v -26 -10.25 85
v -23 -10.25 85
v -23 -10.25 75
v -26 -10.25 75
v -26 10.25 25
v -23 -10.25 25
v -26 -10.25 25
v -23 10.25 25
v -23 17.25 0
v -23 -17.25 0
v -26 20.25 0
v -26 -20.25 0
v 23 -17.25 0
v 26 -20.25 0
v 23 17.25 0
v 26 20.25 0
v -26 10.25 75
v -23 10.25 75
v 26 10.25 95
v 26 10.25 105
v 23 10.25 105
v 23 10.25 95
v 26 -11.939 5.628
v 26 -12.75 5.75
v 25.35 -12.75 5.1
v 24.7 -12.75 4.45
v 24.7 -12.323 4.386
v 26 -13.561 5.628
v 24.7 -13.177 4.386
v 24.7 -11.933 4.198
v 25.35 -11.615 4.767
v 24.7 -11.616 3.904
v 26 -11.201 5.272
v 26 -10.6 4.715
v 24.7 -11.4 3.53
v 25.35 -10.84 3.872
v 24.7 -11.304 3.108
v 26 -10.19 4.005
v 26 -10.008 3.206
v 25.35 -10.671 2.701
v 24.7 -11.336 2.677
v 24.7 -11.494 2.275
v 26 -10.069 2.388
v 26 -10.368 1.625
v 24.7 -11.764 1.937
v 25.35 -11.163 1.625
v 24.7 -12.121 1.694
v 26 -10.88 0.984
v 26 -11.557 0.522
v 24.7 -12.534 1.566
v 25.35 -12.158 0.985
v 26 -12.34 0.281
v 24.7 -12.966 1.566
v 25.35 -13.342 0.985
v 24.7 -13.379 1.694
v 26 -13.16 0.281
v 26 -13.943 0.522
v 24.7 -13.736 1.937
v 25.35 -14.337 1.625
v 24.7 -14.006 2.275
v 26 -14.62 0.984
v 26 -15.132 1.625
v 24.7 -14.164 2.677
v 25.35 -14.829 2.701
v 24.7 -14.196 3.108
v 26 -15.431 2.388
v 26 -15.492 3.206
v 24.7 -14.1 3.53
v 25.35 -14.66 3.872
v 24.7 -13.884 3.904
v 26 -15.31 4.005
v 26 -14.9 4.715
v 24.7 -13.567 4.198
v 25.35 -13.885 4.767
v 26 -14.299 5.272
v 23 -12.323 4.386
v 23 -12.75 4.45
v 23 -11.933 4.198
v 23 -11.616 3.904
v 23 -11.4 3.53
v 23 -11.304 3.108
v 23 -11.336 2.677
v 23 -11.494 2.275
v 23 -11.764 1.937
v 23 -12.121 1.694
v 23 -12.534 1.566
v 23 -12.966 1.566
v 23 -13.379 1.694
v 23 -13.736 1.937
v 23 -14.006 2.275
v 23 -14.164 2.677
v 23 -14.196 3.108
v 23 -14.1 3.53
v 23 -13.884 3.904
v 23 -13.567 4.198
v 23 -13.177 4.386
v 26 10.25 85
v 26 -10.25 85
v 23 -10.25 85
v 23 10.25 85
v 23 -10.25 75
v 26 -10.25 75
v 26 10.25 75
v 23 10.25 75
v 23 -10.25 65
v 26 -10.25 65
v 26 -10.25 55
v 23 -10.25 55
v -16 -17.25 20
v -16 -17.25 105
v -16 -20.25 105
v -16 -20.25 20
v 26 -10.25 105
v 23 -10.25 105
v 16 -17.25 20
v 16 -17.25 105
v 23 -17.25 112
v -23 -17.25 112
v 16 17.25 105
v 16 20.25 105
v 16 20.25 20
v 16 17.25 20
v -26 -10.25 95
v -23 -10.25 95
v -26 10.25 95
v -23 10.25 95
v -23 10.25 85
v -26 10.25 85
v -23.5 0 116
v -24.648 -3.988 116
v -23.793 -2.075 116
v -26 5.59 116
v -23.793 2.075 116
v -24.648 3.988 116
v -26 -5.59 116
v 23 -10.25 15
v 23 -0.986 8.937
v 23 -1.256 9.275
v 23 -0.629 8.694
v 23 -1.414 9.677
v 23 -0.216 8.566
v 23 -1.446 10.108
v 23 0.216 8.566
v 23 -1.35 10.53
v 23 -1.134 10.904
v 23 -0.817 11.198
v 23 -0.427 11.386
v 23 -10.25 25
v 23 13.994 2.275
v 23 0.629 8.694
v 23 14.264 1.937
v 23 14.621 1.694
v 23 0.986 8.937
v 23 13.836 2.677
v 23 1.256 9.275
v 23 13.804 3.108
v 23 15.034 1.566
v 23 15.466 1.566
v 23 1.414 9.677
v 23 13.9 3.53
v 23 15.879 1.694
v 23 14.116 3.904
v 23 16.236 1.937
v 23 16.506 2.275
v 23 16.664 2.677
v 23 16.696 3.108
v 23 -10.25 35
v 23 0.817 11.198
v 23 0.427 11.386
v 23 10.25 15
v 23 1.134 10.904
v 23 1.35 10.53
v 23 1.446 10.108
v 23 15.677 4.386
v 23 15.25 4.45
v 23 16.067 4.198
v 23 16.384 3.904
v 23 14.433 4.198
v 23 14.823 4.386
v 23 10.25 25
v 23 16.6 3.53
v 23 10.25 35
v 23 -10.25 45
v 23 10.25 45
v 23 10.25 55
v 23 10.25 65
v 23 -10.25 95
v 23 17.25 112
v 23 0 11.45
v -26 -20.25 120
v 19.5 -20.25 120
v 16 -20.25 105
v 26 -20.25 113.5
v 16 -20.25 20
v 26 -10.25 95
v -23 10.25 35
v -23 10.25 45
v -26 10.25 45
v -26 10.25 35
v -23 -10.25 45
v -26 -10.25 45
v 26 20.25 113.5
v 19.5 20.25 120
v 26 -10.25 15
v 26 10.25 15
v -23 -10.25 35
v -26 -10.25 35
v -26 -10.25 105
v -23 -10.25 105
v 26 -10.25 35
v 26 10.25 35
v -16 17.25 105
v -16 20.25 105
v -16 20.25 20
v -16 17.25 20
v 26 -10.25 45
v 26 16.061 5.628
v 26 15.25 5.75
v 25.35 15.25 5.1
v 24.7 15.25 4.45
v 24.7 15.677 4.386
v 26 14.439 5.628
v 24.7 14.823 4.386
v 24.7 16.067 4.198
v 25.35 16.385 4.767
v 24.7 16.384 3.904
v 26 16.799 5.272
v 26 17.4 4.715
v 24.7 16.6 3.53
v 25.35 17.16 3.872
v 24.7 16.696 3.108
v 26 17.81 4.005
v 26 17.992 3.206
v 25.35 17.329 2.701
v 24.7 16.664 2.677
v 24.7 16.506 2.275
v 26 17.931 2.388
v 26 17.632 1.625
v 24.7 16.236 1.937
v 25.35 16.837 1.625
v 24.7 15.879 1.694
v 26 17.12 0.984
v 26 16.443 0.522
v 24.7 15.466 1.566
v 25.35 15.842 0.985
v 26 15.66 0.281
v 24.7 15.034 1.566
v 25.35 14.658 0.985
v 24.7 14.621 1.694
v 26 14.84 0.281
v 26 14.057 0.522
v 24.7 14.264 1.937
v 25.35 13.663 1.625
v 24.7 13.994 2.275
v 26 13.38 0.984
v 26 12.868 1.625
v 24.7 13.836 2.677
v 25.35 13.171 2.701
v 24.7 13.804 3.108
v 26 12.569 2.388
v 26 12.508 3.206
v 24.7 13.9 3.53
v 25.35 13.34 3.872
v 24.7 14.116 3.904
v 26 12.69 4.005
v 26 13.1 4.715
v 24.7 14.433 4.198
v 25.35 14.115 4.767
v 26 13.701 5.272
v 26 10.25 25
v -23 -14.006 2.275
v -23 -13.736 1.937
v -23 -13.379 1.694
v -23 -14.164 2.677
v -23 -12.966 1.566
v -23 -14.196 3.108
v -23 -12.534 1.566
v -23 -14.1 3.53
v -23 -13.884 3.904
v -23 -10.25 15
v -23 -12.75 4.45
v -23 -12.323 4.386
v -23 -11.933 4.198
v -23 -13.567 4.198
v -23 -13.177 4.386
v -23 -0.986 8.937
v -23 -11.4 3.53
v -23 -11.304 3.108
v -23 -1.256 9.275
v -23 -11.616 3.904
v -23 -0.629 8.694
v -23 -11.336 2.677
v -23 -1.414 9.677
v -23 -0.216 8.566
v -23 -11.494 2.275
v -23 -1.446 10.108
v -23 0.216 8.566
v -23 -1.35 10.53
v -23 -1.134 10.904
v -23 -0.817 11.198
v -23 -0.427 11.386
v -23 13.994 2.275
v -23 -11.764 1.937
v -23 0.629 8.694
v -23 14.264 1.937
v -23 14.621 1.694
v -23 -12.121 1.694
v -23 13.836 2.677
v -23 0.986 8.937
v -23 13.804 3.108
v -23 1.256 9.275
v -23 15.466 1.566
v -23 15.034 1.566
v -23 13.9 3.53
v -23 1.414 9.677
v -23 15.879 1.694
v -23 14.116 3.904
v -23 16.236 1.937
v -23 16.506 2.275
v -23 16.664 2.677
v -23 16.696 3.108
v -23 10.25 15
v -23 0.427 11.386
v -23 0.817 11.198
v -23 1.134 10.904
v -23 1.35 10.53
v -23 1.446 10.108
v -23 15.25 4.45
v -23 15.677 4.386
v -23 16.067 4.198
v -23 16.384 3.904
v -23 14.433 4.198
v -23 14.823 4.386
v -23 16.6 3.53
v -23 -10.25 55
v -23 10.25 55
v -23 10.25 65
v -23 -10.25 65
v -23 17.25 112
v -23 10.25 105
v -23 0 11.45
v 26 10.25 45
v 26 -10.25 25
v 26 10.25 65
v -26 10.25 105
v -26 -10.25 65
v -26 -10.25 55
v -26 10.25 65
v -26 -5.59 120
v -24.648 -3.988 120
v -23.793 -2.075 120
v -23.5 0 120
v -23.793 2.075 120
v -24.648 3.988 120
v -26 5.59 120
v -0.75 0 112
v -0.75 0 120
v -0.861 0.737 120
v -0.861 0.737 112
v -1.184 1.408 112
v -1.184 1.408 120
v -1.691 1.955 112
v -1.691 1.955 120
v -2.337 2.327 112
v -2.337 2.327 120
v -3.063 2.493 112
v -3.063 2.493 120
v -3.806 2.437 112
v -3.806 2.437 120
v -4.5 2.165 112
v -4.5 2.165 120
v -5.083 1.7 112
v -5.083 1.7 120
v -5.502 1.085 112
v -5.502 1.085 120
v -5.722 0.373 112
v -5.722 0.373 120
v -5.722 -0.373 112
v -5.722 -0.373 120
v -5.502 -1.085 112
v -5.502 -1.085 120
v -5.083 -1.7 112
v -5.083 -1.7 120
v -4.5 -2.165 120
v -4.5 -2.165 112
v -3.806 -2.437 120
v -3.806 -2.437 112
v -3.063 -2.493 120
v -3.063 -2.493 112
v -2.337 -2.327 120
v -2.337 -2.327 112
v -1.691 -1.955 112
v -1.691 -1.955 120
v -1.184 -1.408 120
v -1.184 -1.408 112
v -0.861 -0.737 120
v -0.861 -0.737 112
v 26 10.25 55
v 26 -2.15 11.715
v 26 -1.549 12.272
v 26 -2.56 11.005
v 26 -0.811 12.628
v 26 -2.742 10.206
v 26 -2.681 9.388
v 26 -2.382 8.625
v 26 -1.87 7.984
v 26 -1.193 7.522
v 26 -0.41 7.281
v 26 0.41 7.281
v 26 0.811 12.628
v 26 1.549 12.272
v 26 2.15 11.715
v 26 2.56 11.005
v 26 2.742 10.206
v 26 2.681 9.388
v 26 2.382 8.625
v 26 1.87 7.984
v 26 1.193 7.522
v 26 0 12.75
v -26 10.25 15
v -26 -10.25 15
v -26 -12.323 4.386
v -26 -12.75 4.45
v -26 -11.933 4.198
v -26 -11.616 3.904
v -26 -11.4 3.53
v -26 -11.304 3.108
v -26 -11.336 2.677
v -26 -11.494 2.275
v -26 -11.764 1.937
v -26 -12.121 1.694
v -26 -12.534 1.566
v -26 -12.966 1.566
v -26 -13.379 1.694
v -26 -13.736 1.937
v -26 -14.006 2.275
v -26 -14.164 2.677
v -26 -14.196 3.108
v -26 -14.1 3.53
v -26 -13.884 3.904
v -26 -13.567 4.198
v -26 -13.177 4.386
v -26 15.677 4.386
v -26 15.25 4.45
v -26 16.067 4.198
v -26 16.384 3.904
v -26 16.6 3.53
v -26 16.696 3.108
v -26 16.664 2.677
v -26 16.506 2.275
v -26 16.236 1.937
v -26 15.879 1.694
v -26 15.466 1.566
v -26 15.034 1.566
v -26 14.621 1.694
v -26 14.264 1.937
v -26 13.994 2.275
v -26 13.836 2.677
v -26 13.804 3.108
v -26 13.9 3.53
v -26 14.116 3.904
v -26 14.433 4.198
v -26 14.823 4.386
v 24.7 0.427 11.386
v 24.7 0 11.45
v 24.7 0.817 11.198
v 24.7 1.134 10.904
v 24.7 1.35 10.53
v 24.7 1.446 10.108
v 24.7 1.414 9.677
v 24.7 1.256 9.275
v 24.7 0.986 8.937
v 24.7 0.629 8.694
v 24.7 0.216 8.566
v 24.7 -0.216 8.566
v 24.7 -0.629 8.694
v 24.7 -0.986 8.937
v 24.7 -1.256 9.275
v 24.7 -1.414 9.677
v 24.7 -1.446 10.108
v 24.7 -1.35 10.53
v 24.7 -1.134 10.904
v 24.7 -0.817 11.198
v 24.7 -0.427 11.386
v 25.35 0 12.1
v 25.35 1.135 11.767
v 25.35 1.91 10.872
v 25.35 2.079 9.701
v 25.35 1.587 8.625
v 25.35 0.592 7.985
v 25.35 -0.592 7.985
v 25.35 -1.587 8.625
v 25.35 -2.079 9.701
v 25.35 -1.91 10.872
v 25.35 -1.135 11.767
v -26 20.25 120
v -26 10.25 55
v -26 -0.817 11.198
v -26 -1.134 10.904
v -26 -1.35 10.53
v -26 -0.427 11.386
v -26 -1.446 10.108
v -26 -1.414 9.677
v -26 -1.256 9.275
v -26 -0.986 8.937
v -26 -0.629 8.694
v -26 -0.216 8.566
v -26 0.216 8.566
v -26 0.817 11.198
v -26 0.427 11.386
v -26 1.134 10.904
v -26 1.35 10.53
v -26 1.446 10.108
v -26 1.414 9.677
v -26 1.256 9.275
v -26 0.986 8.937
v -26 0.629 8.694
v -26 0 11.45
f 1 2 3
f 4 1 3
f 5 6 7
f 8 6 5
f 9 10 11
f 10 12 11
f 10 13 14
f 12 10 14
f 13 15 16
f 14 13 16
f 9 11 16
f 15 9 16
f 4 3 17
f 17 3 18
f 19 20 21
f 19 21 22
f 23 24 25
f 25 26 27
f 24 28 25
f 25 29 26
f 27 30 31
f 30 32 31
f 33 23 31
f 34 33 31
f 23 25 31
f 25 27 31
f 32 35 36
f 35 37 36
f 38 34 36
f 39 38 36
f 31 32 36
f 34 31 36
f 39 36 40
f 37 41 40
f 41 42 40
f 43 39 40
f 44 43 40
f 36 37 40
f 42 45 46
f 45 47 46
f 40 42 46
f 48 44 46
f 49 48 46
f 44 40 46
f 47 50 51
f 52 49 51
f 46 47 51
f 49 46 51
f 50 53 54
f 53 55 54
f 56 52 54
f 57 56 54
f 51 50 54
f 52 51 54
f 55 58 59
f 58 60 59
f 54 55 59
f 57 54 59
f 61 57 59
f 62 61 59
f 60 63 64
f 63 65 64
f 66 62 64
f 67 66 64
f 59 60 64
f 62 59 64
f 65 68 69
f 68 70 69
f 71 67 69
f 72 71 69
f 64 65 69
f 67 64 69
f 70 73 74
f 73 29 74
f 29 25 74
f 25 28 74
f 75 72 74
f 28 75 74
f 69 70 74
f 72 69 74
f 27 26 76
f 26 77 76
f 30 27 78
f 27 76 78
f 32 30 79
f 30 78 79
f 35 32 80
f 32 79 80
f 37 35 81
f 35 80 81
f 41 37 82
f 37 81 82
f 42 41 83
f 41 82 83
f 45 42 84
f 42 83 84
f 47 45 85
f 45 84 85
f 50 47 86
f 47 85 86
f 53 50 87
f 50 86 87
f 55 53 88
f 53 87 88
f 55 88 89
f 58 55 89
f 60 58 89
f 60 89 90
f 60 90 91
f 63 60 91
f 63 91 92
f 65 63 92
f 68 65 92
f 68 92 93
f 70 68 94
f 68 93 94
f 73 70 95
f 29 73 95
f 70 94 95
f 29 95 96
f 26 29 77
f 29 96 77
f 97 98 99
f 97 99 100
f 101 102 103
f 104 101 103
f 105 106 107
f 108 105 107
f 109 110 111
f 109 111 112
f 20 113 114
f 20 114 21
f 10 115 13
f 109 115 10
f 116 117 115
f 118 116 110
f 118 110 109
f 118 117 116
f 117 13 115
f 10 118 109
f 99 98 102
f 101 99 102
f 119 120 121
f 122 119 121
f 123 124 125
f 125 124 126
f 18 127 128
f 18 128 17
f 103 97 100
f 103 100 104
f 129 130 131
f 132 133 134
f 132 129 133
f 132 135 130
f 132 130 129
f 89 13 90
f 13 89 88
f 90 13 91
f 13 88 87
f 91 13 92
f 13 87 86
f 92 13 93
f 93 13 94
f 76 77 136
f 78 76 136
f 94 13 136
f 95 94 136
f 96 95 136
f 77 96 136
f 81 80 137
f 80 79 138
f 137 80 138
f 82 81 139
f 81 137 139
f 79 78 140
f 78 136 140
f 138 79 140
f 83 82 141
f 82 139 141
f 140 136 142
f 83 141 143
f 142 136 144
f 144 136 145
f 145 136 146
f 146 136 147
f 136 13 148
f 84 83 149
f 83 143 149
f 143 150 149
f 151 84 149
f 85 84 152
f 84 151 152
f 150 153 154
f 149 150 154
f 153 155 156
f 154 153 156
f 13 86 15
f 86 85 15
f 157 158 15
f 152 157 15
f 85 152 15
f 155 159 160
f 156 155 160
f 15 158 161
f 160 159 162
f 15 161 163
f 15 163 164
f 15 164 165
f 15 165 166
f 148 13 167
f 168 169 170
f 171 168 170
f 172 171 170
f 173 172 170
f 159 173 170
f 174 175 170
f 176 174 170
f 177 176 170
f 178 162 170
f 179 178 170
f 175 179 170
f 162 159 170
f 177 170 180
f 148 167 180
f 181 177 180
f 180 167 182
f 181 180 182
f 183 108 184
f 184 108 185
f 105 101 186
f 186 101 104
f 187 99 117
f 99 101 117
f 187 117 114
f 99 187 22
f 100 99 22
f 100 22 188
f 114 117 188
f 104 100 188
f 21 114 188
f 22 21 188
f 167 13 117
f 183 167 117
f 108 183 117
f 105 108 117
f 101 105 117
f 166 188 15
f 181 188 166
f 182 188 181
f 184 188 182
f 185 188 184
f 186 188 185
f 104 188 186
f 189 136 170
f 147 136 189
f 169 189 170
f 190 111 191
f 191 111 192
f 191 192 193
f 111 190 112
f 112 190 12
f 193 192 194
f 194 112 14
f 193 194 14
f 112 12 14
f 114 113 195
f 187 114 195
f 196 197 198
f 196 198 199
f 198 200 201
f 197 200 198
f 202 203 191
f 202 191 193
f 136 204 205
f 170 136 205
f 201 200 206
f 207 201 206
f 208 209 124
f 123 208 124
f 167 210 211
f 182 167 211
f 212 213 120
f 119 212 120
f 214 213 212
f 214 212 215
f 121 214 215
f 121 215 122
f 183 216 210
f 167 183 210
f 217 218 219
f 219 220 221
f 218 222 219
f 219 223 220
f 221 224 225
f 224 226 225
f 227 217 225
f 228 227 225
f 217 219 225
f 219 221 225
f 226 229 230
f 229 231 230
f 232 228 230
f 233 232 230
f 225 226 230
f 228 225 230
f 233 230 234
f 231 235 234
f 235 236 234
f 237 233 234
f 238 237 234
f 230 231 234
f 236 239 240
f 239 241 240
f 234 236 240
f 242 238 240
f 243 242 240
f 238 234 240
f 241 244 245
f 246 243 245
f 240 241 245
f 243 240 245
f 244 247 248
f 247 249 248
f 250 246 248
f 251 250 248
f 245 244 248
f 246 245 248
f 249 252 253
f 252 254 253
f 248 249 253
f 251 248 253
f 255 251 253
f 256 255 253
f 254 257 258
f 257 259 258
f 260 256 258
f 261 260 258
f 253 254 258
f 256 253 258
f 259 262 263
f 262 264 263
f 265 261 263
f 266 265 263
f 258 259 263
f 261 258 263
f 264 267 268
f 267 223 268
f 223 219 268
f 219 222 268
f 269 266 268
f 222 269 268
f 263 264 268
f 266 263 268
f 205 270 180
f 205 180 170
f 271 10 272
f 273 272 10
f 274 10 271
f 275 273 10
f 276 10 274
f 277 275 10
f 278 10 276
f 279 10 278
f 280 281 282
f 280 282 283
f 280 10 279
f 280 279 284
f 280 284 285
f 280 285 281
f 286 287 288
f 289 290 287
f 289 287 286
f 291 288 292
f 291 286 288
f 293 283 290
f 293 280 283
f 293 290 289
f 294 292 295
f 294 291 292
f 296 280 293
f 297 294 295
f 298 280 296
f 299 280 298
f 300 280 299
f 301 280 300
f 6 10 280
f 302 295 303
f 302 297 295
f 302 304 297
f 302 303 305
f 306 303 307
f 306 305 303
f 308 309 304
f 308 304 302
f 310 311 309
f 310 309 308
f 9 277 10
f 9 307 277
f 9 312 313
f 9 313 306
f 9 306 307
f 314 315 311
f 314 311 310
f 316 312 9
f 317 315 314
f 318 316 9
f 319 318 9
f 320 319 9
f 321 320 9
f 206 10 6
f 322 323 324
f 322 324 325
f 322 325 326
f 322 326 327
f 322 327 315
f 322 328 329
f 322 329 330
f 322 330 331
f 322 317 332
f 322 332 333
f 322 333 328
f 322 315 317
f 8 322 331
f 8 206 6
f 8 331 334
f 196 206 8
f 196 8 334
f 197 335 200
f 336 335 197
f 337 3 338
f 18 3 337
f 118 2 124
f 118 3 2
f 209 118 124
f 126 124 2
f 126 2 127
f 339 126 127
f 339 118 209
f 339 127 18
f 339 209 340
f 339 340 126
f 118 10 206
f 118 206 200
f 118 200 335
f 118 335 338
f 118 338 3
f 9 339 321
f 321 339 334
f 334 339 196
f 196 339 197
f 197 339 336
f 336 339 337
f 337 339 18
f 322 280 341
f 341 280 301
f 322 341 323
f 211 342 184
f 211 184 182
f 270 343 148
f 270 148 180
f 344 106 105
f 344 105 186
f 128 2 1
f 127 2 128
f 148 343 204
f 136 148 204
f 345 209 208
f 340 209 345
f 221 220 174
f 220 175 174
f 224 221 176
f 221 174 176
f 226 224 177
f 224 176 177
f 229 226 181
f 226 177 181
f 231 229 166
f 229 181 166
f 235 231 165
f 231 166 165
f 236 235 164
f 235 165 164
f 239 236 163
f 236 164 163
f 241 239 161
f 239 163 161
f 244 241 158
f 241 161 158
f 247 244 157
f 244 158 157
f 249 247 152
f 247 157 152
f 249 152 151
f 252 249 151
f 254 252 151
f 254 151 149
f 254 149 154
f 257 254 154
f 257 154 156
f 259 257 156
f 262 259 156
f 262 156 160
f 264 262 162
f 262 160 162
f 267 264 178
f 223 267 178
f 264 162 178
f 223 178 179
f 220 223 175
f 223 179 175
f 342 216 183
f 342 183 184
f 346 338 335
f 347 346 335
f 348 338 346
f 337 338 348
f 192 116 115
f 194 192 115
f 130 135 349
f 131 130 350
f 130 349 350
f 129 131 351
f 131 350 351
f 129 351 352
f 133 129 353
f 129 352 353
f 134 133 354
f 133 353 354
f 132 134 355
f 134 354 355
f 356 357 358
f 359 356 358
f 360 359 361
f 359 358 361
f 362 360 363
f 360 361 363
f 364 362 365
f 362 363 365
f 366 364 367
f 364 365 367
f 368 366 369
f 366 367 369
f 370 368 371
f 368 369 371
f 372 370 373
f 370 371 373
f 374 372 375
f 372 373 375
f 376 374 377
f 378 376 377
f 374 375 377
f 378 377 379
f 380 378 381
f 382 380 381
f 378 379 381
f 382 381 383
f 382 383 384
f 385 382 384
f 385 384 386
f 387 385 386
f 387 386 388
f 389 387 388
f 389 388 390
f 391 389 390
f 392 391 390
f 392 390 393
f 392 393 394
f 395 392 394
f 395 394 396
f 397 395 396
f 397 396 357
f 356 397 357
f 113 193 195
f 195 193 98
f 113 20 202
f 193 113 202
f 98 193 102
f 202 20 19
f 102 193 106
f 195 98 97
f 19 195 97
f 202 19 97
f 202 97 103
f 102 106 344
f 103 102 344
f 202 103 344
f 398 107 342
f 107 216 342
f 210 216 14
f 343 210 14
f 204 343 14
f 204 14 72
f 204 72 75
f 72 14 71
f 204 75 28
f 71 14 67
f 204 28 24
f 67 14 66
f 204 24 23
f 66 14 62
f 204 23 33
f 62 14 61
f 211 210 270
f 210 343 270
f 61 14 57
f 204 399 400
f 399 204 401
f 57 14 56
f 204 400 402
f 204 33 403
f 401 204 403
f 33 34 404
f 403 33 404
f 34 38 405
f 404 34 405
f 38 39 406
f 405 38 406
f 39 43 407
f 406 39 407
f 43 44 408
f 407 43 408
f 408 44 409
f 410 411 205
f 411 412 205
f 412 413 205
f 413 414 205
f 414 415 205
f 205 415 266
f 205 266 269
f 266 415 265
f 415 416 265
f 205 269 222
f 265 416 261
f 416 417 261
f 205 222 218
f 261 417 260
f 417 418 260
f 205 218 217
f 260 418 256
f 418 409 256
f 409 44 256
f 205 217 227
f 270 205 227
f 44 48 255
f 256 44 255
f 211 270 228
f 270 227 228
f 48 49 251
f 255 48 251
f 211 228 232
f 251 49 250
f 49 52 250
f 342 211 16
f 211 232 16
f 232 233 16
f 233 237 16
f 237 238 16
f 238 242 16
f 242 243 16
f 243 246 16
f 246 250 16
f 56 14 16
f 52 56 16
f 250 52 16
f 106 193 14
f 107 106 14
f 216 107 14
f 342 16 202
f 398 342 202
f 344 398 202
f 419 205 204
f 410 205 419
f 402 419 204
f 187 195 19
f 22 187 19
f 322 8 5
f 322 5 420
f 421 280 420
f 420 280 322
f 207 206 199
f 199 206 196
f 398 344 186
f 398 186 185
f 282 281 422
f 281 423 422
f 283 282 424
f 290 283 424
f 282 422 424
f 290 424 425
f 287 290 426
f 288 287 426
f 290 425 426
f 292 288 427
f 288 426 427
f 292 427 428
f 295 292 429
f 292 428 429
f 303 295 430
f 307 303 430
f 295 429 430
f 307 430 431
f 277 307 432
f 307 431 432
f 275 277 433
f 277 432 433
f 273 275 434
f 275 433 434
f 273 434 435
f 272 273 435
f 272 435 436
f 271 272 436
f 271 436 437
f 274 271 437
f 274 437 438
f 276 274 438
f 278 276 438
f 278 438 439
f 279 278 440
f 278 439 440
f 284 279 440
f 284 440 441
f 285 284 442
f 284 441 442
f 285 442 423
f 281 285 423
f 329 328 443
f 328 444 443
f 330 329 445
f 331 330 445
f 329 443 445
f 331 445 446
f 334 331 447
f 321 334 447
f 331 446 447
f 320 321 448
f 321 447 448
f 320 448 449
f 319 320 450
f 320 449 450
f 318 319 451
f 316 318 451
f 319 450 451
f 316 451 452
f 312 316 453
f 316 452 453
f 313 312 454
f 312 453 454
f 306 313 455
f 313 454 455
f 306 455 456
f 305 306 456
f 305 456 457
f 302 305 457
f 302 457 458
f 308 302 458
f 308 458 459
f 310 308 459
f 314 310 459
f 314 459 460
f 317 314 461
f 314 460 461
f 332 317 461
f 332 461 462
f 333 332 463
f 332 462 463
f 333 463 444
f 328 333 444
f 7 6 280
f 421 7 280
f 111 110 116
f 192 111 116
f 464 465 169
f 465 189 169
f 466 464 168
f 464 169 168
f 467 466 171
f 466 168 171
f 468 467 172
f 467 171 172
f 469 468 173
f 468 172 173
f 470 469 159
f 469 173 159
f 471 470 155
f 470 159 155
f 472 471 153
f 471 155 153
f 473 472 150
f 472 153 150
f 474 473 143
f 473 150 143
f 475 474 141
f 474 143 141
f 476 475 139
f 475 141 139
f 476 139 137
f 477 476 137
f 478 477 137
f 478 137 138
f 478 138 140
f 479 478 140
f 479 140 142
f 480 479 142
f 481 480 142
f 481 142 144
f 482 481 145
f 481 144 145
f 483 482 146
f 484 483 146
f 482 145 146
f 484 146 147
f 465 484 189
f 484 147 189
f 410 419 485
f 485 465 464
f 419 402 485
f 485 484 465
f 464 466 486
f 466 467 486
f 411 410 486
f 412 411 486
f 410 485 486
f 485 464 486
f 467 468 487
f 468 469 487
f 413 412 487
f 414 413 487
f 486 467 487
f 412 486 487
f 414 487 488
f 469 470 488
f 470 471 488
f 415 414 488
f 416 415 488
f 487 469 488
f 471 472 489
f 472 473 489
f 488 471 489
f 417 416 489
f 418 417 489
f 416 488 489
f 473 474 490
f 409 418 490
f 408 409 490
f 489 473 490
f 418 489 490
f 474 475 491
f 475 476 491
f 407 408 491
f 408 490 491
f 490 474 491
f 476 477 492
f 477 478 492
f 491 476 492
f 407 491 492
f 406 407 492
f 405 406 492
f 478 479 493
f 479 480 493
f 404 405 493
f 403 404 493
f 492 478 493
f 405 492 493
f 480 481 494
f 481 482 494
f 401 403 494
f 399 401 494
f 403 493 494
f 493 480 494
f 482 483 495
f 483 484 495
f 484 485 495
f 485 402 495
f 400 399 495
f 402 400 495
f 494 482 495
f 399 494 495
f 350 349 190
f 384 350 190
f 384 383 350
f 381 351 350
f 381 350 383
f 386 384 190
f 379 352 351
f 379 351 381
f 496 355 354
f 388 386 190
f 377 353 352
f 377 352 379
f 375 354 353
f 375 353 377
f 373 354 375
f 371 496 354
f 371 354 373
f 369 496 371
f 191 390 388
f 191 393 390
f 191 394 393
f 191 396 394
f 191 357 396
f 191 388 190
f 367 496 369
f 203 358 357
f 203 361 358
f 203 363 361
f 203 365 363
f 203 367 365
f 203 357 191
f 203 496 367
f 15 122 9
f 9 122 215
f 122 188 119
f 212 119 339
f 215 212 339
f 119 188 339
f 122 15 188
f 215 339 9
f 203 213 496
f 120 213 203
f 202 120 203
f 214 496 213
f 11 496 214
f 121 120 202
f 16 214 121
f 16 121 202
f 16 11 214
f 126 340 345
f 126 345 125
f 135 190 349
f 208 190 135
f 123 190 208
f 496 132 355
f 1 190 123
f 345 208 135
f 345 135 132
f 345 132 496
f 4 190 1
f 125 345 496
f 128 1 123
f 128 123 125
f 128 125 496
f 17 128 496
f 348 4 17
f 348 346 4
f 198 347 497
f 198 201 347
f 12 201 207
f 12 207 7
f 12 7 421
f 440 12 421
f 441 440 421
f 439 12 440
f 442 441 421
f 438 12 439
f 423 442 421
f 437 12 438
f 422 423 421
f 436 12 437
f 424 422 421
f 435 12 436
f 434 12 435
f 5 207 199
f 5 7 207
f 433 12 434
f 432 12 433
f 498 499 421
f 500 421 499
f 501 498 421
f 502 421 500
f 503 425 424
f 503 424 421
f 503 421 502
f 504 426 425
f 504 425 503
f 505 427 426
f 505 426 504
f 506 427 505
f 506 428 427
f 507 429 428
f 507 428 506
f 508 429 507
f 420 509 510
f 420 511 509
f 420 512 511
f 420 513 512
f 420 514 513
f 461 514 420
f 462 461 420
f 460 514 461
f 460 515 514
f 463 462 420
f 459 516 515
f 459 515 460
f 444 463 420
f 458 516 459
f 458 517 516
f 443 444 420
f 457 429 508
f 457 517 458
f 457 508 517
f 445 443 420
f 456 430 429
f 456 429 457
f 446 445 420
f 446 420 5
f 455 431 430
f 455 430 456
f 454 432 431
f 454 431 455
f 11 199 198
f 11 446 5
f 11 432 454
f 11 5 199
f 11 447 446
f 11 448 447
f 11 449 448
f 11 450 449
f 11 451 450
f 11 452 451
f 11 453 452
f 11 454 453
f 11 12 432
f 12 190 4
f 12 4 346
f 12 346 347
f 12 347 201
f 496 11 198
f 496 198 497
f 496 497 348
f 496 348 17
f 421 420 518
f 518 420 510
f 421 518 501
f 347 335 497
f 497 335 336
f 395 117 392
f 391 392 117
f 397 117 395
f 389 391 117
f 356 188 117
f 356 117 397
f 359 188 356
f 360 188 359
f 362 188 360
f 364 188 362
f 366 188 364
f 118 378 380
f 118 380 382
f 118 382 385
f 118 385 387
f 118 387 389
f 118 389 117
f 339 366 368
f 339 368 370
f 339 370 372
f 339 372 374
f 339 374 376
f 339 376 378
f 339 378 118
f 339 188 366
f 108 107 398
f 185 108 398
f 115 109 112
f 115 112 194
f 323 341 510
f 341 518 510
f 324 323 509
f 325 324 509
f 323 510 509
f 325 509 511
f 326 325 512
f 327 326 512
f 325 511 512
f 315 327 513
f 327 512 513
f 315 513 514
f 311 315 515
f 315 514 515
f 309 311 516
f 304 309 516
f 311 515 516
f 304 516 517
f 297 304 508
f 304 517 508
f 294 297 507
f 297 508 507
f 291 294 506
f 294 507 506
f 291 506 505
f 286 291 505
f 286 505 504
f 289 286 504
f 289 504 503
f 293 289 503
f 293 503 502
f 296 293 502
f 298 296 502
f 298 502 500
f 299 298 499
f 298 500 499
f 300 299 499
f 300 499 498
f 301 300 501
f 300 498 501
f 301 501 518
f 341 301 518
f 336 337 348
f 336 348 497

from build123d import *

# Parameters (mm, degrees)
MAIN_SKETCH_W                                    = 52
MAIN_SKETCH_H                                    = 40.5
MAIN_EXTRUSION_DEPTH                             = 120
MAIN_HOLE_START                                  = -112
MAIN_HOLE_SKETCH_W                               = 46
MAIN_HOLE_SKETCH_H                               = 34.5
MAIN_HOLE_DEPTH                                  = 112
FRAISAGE_POUR_VIS_T_TE_FRAIS_E_M2_51_D           = 2.9
FRAISAGE_POUR_VIS_T_TE_FRAIS_E_M2_51_CSINK_D     = 5.5
FRAISAGE_POUR_VIS_T_TE_FRAIS_E_M2_51_CSINK_ANGLE = 90
ESQUISSE6_W                                      = 10
ESQUISSE6_H                                      = 20.5
ENL_V_MAT_EXTRU_3_DEPTH                          = 133.340706134
ESQUISSE7_W                                      = 32
ESQUISSE7_H                                      = 85
ENL_V_MAT_EXTRU_4_DEPTH                          = 130.291337684
R_P_TITION_LIN_AIRE1_COUNT                       = 5
R_P_TITION_LIN_AIRE1_PITCH                       = 20
ENL_V_MAT_EXTRU_5_DEPTH                          = 130.291337684
ESQUISSE10_R                                     = 7.5
ENL_V_MAT_EXTRU_7_DEPTH                          = 4
FRAISAGE_POUR_VIS_T_TE_FRAIS_E_M2_52_D           = 2.9
FRAISAGE_POUR_VIS_T_TE_FRAIS_E_M2_52_CSINK_D     = 5.5
FRAISAGE_POUR_VIS_T_TE_FRAIS_E_M2_52_CSINK_ANGLE = 90
R_P_TITION_LIN_AIRE3_COUNT                       = 2
R_P_TITION_LIN_AIRE3_PITCH                       = 28
ENL_V_MAT_EXTRU_8_REACH                          = 126.443
ESQUISSE13_R                                     = 2.5


with BuildPart() as part:
    # Main-Sketch → Main-Extrusion (new body)
    with BuildSketch(Plane.XY):
        Rectangle(MAIN_SKETCH_W, MAIN_SKETCH_H)
    extrude(amount=MAIN_EXTRUSION_DEPTH)

    # Main-Hole-Sketch → Main-Hole (cut)
    with BuildSketch(Plane(origin=(0, 0, 0), x_dir=(-1, 0, 0), z_dir=(0, 0, -1)).offset(MAIN_HOLE_START)):
        Rectangle(MAIN_HOLE_SKETCH_W, MAIN_HOLE_SKETCH_H)
    extrude(amount=MAIN_HOLE_DEPTH, mode=Mode.SUBTRACT)

    # Fraisage pour vis à tête fraisée M2.51 (through all)
    with Locations(Plane(origin=(26, 0, 0), x_dir=(0, 0, -1), z_dir=(1, 0, 0))):
        with Locations((-10, 0)):
            CounterSinkHole(FRAISAGE_POUR_VIS_T_TE_FRAIS_E_M2_51_D / 2, FRAISAGE_POUR_VIS_T_TE_FRAIS_E_M2_51_CSINK_D / 2, counter_sink_angle=FRAISAGE_POUR_VIS_T_TE_FRAIS_E_M2_51_CSINK_ANGLE)

    # Esquisse6 → Enlèv. mat.-Extru.3 (cut, through all)
    with BuildSketch(Plane(origin=(26, 0, 0), x_dir=(0, 0, -1), z_dir=(1, 0, 0))):
        with Locations((-100, 0)):
            Rectangle(ESQUISSE6_W, ESQUISSE6_H)
    enl_v_mat_extru_3 = extrude(amount=-ENL_V_MAT_EXTRU_3_DEPTH, mode=Mode.SUBTRACT)

    # Esquisse7 → Enlèv. mat.-Extru.4 (cut, through all)
    with BuildSketch(Plane(origin=(0, 20.25, 0), x_dir=(1, 0, 0), z_dir=(0, 1, 0))):
        with Locations((0, -62.5)):
            Rectangle(ESQUISSE7_W, ESQUISSE7_H)
    extrude(amount=-ENL_V_MAT_EXTRU_4_DEPTH, mode=Mode.SUBTRACT)

    # Répétition linéaire1: Enlèv. mat.-Extru.3 ×5
    with Locations(*[(0, 0, -i * R_P_TITION_LIN_AIRE1_PITCH) for i in range(1, R_P_TITION_LIN_AIRE1_COUNT)]):
        add(enl_v_mat_extru_3, mode=Mode.SUBTRACT)

    # Esquisse8 → Enlèv. mat.-Extru.5 (cut, through all)
    with BuildSketch(Plane(origin=(0, 20.25, 0), x_dir=(-1, 0, 0), z_dir=(0, 1, 0))):
        Polygon((-19.5, 120), (-26, 113.5), (-26, 120), align=None)
    extrude(amount=-ENL_V_MAT_EXTRU_5_DEPTH, mode=Mode.SUBTRACT)

    # Esquisse10 → Enlèv. mat.-Extru.7 (cut)
    with BuildSketch(Plane.XY.offset(120)):
        with Locations((-31, 0)):
            Circle(ESQUISSE10_R)
    extrude(amount=-ENL_V_MAT_EXTRU_7_DEPTH, mode=Mode.SUBTRACT)

    # Fraisage pour vis à tête fraisée M2.52 (through all)
    with Locations(Plane(origin=(26, 0, 0), x_dir=(0, 0, -1), z_dir=(1, 0, 0))):
        with Locations((-3, 15.25)):
            fraisage_pour_vis_t_te_frais_e_m2_52 = CounterSinkHole(FRAISAGE_POUR_VIS_T_TE_FRAIS_E_M2_52_D / 2, FRAISAGE_POUR_VIS_T_TE_FRAIS_E_M2_52_CSINK_D / 2, counter_sink_angle=FRAISAGE_POUR_VIS_T_TE_FRAIS_E_M2_52_CSINK_ANGLE)

    # Répétition linéaire3: Fraisage pour vis à tête fraisée M2.52 ×2
    with Locations(*[(0, -i * R_P_TITION_LIN_AIRE3_PITCH, 0) for i in range(1, R_P_TITION_LIN_AIRE3_COUNT)]):
        add(fraisage_pour_vis_t_te_frais_e_m2_52, mode=Mode.SUBTRACT)

    # Esquisse13 → Enlèv. mat.-Extru.8 (cut, up to next)
    with BuildSketch(Plane.XY.offset(120), mode=Mode.PRIVATE) as enl_v_mat_extru_8_sk1:
        with Locations((-3.25, 0)):
            Circle(ESQUISSE13_R)
    enl_v_mat_extru_8_tool1 = extrude(enl_v_mat_extru_8_sk1.sketch, amount=-ENL_V_MAT_EXTRU_8_REACH, mode=Mode.PRIVATE) & part.part
    add(enl_v_mat_extru_8_tool1.solids().sort_by_distance((-3.25, 0, 120))[0], mode=Mode.SUBTRACT)


solid = part.part
